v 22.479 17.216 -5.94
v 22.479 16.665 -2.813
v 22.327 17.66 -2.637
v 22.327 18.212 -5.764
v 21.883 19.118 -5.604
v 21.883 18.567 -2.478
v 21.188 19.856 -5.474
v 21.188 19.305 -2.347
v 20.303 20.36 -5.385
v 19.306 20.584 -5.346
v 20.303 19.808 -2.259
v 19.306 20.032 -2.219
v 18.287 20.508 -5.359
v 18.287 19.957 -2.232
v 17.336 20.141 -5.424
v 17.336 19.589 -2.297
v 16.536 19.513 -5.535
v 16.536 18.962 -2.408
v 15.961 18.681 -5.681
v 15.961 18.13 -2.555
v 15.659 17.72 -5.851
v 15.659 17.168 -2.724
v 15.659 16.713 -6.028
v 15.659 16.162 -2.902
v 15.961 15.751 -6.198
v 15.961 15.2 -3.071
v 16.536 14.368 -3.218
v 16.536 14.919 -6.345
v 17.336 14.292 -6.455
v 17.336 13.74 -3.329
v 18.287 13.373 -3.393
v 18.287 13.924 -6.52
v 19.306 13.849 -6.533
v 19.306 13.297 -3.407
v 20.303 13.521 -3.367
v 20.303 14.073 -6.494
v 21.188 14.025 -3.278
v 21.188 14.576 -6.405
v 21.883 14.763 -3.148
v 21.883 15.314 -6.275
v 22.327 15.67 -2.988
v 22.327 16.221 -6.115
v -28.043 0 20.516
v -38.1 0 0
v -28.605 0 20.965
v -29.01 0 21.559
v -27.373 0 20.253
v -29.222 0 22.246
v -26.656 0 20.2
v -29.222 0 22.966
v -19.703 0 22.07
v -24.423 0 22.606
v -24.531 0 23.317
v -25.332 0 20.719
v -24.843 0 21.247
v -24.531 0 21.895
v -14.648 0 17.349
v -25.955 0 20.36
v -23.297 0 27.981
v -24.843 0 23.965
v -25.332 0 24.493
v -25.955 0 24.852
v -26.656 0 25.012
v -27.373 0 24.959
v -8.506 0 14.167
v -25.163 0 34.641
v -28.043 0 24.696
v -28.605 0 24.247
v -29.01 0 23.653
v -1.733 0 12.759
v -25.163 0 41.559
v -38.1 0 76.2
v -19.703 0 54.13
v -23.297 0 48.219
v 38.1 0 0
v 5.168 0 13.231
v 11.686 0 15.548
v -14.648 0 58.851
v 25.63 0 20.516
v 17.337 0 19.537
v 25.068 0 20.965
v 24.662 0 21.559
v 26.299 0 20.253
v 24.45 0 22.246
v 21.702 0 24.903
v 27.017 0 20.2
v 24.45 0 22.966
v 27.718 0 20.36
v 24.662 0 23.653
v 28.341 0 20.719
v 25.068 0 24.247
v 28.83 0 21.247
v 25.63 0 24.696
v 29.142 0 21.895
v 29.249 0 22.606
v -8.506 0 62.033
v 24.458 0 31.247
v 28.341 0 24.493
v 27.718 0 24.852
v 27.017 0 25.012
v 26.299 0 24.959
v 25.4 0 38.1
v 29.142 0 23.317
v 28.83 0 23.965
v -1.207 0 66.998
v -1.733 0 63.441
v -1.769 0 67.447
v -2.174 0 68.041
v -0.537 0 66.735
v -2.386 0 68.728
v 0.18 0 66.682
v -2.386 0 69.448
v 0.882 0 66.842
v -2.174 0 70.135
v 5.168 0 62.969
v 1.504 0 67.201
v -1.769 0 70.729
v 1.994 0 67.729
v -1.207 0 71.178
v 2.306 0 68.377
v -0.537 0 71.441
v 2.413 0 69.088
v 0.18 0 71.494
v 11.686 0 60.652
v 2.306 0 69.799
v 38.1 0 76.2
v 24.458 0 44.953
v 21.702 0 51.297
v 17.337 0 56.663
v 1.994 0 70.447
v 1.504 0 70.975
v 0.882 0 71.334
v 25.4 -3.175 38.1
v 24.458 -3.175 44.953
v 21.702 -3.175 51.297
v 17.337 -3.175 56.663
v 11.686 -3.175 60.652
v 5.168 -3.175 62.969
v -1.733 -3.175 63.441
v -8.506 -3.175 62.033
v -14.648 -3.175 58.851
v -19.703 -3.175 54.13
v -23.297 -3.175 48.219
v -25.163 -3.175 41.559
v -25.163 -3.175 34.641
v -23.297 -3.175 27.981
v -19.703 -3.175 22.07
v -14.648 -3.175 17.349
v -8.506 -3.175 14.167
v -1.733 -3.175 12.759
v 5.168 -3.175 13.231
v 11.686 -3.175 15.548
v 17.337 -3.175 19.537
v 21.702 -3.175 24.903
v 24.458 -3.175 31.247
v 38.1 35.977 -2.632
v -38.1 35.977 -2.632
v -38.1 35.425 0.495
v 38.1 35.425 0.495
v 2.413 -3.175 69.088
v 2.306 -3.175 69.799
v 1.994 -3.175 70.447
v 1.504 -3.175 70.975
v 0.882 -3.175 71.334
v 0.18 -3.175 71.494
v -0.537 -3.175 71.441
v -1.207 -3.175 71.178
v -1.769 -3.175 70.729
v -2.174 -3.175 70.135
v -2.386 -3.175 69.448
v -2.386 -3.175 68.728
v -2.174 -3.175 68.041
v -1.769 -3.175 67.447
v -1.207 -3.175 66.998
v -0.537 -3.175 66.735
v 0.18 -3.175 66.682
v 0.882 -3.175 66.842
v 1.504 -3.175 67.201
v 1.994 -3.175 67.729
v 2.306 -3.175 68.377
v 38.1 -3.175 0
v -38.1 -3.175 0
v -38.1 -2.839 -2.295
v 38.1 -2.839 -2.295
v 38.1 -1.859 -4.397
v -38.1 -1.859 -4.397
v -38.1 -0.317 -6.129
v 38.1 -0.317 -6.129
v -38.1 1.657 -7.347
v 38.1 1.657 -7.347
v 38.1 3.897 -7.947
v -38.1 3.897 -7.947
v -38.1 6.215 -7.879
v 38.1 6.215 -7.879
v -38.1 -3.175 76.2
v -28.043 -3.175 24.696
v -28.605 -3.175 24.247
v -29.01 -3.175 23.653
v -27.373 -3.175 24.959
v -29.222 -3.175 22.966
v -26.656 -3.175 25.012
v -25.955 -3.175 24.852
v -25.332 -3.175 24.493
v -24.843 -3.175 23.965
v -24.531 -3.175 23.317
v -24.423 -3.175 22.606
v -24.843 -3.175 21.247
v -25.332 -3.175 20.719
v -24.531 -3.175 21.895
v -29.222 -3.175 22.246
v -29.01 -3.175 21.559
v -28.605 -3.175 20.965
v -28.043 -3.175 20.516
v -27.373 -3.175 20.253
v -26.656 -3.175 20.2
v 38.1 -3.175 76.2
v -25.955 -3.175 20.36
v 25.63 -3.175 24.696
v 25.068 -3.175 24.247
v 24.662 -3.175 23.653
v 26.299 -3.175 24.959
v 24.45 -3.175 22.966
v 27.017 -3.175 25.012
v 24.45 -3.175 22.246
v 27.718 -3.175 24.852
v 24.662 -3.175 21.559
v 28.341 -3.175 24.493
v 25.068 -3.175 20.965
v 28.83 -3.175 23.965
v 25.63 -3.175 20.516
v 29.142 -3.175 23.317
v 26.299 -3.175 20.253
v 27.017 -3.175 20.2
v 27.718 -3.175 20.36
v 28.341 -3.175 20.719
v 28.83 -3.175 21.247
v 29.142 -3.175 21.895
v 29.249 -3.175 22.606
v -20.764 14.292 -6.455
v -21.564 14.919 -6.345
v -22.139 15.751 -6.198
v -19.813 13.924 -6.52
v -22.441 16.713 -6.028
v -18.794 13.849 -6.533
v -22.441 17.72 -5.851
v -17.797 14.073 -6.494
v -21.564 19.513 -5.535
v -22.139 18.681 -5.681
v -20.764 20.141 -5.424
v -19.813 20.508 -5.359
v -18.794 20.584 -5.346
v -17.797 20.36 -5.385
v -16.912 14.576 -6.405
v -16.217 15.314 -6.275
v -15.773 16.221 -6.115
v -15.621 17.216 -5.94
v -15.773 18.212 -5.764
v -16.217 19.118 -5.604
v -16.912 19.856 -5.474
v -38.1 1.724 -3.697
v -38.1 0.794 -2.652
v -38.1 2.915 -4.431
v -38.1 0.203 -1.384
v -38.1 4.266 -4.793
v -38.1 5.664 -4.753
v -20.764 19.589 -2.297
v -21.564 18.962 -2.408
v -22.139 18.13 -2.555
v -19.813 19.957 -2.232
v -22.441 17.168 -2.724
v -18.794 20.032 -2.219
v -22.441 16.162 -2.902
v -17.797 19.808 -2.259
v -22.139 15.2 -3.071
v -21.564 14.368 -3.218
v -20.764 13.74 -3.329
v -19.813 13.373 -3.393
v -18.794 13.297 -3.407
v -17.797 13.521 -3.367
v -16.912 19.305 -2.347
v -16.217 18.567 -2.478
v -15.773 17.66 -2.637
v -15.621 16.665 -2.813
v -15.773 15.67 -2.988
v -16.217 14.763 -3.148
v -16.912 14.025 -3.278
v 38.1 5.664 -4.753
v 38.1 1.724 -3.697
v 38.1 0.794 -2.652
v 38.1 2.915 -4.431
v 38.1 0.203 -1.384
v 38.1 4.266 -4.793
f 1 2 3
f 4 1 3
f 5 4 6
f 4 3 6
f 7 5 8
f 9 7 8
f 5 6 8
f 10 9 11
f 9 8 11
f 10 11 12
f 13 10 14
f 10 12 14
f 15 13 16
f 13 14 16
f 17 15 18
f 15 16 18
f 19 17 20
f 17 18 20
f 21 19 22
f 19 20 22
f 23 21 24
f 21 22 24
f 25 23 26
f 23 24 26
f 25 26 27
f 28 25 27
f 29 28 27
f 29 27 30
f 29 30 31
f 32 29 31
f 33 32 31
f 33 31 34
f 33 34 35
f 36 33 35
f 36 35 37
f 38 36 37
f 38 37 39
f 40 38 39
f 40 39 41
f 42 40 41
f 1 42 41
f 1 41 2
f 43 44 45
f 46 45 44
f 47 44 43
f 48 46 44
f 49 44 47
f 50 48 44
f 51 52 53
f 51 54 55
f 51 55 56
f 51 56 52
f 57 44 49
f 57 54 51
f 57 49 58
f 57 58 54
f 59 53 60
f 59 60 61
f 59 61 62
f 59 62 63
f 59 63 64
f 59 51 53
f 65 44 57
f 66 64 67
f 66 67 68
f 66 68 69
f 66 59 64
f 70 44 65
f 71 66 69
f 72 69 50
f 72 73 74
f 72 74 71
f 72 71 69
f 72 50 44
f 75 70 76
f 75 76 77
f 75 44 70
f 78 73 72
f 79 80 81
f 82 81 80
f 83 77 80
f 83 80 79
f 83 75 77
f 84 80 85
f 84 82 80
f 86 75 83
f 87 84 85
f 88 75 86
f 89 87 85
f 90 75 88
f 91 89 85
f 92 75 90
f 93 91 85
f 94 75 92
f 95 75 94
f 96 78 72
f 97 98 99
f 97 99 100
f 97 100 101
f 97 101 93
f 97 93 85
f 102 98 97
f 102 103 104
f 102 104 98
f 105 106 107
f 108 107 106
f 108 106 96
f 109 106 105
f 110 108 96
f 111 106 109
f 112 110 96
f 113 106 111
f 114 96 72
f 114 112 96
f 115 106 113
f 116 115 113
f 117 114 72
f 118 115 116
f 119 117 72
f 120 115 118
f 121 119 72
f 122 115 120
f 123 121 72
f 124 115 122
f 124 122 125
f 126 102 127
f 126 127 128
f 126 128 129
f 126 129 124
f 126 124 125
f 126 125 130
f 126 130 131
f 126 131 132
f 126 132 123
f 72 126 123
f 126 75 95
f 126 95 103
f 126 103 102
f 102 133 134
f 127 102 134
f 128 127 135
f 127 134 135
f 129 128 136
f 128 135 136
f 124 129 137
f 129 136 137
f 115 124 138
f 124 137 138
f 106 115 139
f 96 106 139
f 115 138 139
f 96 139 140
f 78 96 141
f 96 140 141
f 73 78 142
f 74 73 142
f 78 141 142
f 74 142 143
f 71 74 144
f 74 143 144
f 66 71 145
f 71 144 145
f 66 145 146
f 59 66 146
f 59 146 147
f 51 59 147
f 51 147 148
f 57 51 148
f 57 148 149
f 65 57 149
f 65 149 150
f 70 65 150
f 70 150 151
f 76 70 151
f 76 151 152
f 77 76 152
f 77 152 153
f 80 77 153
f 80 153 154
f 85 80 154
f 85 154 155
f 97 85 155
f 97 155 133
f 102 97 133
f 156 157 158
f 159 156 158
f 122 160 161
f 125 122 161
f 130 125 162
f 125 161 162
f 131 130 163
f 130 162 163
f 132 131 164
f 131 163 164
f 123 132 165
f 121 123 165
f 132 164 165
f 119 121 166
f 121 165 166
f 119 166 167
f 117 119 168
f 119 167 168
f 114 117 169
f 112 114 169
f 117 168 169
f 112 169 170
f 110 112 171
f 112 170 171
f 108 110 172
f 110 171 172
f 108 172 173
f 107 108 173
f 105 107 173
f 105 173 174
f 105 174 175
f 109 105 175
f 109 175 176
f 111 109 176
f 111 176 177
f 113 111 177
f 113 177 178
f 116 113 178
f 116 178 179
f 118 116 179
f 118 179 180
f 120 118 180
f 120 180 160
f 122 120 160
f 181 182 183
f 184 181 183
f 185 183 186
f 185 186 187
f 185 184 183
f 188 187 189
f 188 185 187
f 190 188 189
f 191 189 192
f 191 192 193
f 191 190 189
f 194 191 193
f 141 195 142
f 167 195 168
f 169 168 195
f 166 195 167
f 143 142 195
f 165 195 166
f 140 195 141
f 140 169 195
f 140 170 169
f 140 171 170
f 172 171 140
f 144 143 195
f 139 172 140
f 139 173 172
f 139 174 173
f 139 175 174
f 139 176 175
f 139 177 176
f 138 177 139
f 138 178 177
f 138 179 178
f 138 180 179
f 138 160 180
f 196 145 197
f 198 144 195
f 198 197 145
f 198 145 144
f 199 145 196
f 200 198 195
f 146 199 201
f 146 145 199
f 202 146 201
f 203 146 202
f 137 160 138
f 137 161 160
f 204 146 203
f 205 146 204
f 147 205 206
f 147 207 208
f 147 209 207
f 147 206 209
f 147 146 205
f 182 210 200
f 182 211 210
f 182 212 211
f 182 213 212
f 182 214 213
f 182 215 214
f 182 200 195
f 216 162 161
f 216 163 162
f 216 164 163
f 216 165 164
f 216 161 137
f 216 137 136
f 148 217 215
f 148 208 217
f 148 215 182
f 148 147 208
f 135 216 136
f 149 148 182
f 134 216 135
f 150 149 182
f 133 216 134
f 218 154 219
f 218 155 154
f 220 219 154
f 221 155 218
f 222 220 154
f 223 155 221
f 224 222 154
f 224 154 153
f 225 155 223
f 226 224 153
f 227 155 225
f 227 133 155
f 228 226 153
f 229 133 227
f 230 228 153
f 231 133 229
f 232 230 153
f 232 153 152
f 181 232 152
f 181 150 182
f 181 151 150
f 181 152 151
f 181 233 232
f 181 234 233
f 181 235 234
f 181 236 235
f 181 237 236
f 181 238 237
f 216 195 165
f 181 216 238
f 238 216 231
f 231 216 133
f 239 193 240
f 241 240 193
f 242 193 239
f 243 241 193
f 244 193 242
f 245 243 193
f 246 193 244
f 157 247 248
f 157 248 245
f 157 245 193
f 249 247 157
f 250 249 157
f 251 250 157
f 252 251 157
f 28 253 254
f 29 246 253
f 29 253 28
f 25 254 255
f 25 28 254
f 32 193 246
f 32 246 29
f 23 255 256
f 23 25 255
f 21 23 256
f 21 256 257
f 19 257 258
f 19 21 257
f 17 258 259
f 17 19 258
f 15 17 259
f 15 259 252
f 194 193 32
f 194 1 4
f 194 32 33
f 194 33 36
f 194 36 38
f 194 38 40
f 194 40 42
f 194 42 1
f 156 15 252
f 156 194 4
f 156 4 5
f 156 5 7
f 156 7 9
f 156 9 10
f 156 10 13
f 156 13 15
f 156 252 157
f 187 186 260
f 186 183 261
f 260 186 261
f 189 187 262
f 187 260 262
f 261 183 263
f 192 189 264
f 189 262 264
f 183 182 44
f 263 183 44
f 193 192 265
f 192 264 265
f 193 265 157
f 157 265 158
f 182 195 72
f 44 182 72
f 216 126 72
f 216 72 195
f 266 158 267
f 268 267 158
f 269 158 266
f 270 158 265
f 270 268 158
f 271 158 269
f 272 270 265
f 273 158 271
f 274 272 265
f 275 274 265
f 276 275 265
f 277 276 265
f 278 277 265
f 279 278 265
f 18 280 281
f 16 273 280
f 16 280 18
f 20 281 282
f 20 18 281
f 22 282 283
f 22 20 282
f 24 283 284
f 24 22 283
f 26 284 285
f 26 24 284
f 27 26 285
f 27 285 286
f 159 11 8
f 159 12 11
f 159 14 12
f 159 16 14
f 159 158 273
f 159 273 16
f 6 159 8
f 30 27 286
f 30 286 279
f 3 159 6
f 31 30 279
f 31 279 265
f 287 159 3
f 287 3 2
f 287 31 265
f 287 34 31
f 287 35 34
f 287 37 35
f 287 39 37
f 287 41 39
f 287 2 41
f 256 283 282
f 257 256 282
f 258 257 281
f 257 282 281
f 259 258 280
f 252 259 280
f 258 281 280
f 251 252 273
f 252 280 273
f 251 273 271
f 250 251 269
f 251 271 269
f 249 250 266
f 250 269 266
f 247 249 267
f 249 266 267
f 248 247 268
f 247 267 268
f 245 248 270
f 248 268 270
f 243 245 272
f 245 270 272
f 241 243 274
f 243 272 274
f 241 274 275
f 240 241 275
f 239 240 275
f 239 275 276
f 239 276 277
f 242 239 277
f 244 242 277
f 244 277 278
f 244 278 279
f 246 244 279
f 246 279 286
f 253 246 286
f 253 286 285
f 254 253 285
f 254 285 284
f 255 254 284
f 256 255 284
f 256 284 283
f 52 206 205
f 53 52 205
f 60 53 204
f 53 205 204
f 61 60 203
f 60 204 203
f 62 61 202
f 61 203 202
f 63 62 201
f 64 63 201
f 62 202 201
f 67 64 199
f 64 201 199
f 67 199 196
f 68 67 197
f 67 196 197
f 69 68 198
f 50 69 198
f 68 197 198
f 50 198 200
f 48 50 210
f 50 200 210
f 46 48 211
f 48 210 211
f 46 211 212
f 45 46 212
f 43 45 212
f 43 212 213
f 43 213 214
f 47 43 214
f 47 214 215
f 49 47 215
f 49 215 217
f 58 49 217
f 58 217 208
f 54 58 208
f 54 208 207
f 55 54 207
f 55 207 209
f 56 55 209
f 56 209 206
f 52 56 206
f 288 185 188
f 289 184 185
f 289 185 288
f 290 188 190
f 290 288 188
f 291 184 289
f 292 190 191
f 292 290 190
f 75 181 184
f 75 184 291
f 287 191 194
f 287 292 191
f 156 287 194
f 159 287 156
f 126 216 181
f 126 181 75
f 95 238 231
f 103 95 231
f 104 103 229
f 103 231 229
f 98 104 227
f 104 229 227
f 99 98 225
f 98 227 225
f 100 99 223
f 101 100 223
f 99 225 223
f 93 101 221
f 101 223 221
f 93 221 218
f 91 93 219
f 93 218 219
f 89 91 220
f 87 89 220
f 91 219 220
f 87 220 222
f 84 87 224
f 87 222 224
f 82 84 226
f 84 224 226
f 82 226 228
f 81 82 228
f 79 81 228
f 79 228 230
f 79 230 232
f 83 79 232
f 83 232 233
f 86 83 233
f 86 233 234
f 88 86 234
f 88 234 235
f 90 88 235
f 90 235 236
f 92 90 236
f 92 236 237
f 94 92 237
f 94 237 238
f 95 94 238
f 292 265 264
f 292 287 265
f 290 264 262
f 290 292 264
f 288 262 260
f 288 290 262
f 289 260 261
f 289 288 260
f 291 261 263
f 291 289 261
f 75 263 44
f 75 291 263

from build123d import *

# Parameters (mm, degrees)
F1_DEPTH = 38.1
F2_R     = 25.4
F2_R_2   = 2.413
F3_DEPTH = 25.4
F4_R     = 3.429
F5_DEPTH = 25.4


with BuildPart() as f1:
    # F0 (on Right) → F1 (new body, symmetric)
    with BuildSketch(Plane.YZ):
        with BuildLine():
            ThreePointArc((5.6640261054, -4.752682216), (1.7239069957, -3.6969304825), (0, 0))
            Line((0, 0), (0, 76.2))
            Line((0, 76.2), (-3.175, 76.2))
            Line((-3.175, 76.2), (-3.175, 0))
            ThreePointArc((-3.175, 0), (-0.3169436651, -6.1291215894), (6.2153590695, -7.8794468319))
            Line((6.2153590695, -7.8794468319), (35.9767941298, -2.6317028461))
            Line((35.9767941298, -2.6317028461), (35.4254611657, 0.4950617697))
            Line((35.4254611657, 0.4950617697), (5.6640261054, -4.752682216))
        make_face()
    extrude(amount=F1_DEPTH, both=True)

    # F2 (on face) → F3 (cut)
    with BuildSketch(Plane.XZ.offset(3.175)):
        with Locations((0, 38.1)):
            Circle(F2_R)
        with Locations((-26.8363952125, 22.606)):
            Circle(F2_R_2)
        with Locations((0, 69.088)):
            Circle(F2_R_2)
        with Locations((26.8363952125, 22.606)):
            Circle(F2_R_2)
    extrude(amount=-F3_DEPTH, mode=Mode.SUBTRACT)

    # F4 (on face) → F5 (cut)
    with BuildSketch(Plane(origin=(0, 0.9835478115, -5.5779768219), x_dir=(1, 0, 0), z_dir=(0, -0.1736481777, 0.984807753))):
        with Locations((19.05, 15.9232353842)):
            Circle(F4_R)
        with Locations((-19.05, 15.9232353842)):
            Circle(F4_R)
    extrude(amount=-F5_DEPTH, mode=Mode.SUBTRACT)


solid = f1.part
